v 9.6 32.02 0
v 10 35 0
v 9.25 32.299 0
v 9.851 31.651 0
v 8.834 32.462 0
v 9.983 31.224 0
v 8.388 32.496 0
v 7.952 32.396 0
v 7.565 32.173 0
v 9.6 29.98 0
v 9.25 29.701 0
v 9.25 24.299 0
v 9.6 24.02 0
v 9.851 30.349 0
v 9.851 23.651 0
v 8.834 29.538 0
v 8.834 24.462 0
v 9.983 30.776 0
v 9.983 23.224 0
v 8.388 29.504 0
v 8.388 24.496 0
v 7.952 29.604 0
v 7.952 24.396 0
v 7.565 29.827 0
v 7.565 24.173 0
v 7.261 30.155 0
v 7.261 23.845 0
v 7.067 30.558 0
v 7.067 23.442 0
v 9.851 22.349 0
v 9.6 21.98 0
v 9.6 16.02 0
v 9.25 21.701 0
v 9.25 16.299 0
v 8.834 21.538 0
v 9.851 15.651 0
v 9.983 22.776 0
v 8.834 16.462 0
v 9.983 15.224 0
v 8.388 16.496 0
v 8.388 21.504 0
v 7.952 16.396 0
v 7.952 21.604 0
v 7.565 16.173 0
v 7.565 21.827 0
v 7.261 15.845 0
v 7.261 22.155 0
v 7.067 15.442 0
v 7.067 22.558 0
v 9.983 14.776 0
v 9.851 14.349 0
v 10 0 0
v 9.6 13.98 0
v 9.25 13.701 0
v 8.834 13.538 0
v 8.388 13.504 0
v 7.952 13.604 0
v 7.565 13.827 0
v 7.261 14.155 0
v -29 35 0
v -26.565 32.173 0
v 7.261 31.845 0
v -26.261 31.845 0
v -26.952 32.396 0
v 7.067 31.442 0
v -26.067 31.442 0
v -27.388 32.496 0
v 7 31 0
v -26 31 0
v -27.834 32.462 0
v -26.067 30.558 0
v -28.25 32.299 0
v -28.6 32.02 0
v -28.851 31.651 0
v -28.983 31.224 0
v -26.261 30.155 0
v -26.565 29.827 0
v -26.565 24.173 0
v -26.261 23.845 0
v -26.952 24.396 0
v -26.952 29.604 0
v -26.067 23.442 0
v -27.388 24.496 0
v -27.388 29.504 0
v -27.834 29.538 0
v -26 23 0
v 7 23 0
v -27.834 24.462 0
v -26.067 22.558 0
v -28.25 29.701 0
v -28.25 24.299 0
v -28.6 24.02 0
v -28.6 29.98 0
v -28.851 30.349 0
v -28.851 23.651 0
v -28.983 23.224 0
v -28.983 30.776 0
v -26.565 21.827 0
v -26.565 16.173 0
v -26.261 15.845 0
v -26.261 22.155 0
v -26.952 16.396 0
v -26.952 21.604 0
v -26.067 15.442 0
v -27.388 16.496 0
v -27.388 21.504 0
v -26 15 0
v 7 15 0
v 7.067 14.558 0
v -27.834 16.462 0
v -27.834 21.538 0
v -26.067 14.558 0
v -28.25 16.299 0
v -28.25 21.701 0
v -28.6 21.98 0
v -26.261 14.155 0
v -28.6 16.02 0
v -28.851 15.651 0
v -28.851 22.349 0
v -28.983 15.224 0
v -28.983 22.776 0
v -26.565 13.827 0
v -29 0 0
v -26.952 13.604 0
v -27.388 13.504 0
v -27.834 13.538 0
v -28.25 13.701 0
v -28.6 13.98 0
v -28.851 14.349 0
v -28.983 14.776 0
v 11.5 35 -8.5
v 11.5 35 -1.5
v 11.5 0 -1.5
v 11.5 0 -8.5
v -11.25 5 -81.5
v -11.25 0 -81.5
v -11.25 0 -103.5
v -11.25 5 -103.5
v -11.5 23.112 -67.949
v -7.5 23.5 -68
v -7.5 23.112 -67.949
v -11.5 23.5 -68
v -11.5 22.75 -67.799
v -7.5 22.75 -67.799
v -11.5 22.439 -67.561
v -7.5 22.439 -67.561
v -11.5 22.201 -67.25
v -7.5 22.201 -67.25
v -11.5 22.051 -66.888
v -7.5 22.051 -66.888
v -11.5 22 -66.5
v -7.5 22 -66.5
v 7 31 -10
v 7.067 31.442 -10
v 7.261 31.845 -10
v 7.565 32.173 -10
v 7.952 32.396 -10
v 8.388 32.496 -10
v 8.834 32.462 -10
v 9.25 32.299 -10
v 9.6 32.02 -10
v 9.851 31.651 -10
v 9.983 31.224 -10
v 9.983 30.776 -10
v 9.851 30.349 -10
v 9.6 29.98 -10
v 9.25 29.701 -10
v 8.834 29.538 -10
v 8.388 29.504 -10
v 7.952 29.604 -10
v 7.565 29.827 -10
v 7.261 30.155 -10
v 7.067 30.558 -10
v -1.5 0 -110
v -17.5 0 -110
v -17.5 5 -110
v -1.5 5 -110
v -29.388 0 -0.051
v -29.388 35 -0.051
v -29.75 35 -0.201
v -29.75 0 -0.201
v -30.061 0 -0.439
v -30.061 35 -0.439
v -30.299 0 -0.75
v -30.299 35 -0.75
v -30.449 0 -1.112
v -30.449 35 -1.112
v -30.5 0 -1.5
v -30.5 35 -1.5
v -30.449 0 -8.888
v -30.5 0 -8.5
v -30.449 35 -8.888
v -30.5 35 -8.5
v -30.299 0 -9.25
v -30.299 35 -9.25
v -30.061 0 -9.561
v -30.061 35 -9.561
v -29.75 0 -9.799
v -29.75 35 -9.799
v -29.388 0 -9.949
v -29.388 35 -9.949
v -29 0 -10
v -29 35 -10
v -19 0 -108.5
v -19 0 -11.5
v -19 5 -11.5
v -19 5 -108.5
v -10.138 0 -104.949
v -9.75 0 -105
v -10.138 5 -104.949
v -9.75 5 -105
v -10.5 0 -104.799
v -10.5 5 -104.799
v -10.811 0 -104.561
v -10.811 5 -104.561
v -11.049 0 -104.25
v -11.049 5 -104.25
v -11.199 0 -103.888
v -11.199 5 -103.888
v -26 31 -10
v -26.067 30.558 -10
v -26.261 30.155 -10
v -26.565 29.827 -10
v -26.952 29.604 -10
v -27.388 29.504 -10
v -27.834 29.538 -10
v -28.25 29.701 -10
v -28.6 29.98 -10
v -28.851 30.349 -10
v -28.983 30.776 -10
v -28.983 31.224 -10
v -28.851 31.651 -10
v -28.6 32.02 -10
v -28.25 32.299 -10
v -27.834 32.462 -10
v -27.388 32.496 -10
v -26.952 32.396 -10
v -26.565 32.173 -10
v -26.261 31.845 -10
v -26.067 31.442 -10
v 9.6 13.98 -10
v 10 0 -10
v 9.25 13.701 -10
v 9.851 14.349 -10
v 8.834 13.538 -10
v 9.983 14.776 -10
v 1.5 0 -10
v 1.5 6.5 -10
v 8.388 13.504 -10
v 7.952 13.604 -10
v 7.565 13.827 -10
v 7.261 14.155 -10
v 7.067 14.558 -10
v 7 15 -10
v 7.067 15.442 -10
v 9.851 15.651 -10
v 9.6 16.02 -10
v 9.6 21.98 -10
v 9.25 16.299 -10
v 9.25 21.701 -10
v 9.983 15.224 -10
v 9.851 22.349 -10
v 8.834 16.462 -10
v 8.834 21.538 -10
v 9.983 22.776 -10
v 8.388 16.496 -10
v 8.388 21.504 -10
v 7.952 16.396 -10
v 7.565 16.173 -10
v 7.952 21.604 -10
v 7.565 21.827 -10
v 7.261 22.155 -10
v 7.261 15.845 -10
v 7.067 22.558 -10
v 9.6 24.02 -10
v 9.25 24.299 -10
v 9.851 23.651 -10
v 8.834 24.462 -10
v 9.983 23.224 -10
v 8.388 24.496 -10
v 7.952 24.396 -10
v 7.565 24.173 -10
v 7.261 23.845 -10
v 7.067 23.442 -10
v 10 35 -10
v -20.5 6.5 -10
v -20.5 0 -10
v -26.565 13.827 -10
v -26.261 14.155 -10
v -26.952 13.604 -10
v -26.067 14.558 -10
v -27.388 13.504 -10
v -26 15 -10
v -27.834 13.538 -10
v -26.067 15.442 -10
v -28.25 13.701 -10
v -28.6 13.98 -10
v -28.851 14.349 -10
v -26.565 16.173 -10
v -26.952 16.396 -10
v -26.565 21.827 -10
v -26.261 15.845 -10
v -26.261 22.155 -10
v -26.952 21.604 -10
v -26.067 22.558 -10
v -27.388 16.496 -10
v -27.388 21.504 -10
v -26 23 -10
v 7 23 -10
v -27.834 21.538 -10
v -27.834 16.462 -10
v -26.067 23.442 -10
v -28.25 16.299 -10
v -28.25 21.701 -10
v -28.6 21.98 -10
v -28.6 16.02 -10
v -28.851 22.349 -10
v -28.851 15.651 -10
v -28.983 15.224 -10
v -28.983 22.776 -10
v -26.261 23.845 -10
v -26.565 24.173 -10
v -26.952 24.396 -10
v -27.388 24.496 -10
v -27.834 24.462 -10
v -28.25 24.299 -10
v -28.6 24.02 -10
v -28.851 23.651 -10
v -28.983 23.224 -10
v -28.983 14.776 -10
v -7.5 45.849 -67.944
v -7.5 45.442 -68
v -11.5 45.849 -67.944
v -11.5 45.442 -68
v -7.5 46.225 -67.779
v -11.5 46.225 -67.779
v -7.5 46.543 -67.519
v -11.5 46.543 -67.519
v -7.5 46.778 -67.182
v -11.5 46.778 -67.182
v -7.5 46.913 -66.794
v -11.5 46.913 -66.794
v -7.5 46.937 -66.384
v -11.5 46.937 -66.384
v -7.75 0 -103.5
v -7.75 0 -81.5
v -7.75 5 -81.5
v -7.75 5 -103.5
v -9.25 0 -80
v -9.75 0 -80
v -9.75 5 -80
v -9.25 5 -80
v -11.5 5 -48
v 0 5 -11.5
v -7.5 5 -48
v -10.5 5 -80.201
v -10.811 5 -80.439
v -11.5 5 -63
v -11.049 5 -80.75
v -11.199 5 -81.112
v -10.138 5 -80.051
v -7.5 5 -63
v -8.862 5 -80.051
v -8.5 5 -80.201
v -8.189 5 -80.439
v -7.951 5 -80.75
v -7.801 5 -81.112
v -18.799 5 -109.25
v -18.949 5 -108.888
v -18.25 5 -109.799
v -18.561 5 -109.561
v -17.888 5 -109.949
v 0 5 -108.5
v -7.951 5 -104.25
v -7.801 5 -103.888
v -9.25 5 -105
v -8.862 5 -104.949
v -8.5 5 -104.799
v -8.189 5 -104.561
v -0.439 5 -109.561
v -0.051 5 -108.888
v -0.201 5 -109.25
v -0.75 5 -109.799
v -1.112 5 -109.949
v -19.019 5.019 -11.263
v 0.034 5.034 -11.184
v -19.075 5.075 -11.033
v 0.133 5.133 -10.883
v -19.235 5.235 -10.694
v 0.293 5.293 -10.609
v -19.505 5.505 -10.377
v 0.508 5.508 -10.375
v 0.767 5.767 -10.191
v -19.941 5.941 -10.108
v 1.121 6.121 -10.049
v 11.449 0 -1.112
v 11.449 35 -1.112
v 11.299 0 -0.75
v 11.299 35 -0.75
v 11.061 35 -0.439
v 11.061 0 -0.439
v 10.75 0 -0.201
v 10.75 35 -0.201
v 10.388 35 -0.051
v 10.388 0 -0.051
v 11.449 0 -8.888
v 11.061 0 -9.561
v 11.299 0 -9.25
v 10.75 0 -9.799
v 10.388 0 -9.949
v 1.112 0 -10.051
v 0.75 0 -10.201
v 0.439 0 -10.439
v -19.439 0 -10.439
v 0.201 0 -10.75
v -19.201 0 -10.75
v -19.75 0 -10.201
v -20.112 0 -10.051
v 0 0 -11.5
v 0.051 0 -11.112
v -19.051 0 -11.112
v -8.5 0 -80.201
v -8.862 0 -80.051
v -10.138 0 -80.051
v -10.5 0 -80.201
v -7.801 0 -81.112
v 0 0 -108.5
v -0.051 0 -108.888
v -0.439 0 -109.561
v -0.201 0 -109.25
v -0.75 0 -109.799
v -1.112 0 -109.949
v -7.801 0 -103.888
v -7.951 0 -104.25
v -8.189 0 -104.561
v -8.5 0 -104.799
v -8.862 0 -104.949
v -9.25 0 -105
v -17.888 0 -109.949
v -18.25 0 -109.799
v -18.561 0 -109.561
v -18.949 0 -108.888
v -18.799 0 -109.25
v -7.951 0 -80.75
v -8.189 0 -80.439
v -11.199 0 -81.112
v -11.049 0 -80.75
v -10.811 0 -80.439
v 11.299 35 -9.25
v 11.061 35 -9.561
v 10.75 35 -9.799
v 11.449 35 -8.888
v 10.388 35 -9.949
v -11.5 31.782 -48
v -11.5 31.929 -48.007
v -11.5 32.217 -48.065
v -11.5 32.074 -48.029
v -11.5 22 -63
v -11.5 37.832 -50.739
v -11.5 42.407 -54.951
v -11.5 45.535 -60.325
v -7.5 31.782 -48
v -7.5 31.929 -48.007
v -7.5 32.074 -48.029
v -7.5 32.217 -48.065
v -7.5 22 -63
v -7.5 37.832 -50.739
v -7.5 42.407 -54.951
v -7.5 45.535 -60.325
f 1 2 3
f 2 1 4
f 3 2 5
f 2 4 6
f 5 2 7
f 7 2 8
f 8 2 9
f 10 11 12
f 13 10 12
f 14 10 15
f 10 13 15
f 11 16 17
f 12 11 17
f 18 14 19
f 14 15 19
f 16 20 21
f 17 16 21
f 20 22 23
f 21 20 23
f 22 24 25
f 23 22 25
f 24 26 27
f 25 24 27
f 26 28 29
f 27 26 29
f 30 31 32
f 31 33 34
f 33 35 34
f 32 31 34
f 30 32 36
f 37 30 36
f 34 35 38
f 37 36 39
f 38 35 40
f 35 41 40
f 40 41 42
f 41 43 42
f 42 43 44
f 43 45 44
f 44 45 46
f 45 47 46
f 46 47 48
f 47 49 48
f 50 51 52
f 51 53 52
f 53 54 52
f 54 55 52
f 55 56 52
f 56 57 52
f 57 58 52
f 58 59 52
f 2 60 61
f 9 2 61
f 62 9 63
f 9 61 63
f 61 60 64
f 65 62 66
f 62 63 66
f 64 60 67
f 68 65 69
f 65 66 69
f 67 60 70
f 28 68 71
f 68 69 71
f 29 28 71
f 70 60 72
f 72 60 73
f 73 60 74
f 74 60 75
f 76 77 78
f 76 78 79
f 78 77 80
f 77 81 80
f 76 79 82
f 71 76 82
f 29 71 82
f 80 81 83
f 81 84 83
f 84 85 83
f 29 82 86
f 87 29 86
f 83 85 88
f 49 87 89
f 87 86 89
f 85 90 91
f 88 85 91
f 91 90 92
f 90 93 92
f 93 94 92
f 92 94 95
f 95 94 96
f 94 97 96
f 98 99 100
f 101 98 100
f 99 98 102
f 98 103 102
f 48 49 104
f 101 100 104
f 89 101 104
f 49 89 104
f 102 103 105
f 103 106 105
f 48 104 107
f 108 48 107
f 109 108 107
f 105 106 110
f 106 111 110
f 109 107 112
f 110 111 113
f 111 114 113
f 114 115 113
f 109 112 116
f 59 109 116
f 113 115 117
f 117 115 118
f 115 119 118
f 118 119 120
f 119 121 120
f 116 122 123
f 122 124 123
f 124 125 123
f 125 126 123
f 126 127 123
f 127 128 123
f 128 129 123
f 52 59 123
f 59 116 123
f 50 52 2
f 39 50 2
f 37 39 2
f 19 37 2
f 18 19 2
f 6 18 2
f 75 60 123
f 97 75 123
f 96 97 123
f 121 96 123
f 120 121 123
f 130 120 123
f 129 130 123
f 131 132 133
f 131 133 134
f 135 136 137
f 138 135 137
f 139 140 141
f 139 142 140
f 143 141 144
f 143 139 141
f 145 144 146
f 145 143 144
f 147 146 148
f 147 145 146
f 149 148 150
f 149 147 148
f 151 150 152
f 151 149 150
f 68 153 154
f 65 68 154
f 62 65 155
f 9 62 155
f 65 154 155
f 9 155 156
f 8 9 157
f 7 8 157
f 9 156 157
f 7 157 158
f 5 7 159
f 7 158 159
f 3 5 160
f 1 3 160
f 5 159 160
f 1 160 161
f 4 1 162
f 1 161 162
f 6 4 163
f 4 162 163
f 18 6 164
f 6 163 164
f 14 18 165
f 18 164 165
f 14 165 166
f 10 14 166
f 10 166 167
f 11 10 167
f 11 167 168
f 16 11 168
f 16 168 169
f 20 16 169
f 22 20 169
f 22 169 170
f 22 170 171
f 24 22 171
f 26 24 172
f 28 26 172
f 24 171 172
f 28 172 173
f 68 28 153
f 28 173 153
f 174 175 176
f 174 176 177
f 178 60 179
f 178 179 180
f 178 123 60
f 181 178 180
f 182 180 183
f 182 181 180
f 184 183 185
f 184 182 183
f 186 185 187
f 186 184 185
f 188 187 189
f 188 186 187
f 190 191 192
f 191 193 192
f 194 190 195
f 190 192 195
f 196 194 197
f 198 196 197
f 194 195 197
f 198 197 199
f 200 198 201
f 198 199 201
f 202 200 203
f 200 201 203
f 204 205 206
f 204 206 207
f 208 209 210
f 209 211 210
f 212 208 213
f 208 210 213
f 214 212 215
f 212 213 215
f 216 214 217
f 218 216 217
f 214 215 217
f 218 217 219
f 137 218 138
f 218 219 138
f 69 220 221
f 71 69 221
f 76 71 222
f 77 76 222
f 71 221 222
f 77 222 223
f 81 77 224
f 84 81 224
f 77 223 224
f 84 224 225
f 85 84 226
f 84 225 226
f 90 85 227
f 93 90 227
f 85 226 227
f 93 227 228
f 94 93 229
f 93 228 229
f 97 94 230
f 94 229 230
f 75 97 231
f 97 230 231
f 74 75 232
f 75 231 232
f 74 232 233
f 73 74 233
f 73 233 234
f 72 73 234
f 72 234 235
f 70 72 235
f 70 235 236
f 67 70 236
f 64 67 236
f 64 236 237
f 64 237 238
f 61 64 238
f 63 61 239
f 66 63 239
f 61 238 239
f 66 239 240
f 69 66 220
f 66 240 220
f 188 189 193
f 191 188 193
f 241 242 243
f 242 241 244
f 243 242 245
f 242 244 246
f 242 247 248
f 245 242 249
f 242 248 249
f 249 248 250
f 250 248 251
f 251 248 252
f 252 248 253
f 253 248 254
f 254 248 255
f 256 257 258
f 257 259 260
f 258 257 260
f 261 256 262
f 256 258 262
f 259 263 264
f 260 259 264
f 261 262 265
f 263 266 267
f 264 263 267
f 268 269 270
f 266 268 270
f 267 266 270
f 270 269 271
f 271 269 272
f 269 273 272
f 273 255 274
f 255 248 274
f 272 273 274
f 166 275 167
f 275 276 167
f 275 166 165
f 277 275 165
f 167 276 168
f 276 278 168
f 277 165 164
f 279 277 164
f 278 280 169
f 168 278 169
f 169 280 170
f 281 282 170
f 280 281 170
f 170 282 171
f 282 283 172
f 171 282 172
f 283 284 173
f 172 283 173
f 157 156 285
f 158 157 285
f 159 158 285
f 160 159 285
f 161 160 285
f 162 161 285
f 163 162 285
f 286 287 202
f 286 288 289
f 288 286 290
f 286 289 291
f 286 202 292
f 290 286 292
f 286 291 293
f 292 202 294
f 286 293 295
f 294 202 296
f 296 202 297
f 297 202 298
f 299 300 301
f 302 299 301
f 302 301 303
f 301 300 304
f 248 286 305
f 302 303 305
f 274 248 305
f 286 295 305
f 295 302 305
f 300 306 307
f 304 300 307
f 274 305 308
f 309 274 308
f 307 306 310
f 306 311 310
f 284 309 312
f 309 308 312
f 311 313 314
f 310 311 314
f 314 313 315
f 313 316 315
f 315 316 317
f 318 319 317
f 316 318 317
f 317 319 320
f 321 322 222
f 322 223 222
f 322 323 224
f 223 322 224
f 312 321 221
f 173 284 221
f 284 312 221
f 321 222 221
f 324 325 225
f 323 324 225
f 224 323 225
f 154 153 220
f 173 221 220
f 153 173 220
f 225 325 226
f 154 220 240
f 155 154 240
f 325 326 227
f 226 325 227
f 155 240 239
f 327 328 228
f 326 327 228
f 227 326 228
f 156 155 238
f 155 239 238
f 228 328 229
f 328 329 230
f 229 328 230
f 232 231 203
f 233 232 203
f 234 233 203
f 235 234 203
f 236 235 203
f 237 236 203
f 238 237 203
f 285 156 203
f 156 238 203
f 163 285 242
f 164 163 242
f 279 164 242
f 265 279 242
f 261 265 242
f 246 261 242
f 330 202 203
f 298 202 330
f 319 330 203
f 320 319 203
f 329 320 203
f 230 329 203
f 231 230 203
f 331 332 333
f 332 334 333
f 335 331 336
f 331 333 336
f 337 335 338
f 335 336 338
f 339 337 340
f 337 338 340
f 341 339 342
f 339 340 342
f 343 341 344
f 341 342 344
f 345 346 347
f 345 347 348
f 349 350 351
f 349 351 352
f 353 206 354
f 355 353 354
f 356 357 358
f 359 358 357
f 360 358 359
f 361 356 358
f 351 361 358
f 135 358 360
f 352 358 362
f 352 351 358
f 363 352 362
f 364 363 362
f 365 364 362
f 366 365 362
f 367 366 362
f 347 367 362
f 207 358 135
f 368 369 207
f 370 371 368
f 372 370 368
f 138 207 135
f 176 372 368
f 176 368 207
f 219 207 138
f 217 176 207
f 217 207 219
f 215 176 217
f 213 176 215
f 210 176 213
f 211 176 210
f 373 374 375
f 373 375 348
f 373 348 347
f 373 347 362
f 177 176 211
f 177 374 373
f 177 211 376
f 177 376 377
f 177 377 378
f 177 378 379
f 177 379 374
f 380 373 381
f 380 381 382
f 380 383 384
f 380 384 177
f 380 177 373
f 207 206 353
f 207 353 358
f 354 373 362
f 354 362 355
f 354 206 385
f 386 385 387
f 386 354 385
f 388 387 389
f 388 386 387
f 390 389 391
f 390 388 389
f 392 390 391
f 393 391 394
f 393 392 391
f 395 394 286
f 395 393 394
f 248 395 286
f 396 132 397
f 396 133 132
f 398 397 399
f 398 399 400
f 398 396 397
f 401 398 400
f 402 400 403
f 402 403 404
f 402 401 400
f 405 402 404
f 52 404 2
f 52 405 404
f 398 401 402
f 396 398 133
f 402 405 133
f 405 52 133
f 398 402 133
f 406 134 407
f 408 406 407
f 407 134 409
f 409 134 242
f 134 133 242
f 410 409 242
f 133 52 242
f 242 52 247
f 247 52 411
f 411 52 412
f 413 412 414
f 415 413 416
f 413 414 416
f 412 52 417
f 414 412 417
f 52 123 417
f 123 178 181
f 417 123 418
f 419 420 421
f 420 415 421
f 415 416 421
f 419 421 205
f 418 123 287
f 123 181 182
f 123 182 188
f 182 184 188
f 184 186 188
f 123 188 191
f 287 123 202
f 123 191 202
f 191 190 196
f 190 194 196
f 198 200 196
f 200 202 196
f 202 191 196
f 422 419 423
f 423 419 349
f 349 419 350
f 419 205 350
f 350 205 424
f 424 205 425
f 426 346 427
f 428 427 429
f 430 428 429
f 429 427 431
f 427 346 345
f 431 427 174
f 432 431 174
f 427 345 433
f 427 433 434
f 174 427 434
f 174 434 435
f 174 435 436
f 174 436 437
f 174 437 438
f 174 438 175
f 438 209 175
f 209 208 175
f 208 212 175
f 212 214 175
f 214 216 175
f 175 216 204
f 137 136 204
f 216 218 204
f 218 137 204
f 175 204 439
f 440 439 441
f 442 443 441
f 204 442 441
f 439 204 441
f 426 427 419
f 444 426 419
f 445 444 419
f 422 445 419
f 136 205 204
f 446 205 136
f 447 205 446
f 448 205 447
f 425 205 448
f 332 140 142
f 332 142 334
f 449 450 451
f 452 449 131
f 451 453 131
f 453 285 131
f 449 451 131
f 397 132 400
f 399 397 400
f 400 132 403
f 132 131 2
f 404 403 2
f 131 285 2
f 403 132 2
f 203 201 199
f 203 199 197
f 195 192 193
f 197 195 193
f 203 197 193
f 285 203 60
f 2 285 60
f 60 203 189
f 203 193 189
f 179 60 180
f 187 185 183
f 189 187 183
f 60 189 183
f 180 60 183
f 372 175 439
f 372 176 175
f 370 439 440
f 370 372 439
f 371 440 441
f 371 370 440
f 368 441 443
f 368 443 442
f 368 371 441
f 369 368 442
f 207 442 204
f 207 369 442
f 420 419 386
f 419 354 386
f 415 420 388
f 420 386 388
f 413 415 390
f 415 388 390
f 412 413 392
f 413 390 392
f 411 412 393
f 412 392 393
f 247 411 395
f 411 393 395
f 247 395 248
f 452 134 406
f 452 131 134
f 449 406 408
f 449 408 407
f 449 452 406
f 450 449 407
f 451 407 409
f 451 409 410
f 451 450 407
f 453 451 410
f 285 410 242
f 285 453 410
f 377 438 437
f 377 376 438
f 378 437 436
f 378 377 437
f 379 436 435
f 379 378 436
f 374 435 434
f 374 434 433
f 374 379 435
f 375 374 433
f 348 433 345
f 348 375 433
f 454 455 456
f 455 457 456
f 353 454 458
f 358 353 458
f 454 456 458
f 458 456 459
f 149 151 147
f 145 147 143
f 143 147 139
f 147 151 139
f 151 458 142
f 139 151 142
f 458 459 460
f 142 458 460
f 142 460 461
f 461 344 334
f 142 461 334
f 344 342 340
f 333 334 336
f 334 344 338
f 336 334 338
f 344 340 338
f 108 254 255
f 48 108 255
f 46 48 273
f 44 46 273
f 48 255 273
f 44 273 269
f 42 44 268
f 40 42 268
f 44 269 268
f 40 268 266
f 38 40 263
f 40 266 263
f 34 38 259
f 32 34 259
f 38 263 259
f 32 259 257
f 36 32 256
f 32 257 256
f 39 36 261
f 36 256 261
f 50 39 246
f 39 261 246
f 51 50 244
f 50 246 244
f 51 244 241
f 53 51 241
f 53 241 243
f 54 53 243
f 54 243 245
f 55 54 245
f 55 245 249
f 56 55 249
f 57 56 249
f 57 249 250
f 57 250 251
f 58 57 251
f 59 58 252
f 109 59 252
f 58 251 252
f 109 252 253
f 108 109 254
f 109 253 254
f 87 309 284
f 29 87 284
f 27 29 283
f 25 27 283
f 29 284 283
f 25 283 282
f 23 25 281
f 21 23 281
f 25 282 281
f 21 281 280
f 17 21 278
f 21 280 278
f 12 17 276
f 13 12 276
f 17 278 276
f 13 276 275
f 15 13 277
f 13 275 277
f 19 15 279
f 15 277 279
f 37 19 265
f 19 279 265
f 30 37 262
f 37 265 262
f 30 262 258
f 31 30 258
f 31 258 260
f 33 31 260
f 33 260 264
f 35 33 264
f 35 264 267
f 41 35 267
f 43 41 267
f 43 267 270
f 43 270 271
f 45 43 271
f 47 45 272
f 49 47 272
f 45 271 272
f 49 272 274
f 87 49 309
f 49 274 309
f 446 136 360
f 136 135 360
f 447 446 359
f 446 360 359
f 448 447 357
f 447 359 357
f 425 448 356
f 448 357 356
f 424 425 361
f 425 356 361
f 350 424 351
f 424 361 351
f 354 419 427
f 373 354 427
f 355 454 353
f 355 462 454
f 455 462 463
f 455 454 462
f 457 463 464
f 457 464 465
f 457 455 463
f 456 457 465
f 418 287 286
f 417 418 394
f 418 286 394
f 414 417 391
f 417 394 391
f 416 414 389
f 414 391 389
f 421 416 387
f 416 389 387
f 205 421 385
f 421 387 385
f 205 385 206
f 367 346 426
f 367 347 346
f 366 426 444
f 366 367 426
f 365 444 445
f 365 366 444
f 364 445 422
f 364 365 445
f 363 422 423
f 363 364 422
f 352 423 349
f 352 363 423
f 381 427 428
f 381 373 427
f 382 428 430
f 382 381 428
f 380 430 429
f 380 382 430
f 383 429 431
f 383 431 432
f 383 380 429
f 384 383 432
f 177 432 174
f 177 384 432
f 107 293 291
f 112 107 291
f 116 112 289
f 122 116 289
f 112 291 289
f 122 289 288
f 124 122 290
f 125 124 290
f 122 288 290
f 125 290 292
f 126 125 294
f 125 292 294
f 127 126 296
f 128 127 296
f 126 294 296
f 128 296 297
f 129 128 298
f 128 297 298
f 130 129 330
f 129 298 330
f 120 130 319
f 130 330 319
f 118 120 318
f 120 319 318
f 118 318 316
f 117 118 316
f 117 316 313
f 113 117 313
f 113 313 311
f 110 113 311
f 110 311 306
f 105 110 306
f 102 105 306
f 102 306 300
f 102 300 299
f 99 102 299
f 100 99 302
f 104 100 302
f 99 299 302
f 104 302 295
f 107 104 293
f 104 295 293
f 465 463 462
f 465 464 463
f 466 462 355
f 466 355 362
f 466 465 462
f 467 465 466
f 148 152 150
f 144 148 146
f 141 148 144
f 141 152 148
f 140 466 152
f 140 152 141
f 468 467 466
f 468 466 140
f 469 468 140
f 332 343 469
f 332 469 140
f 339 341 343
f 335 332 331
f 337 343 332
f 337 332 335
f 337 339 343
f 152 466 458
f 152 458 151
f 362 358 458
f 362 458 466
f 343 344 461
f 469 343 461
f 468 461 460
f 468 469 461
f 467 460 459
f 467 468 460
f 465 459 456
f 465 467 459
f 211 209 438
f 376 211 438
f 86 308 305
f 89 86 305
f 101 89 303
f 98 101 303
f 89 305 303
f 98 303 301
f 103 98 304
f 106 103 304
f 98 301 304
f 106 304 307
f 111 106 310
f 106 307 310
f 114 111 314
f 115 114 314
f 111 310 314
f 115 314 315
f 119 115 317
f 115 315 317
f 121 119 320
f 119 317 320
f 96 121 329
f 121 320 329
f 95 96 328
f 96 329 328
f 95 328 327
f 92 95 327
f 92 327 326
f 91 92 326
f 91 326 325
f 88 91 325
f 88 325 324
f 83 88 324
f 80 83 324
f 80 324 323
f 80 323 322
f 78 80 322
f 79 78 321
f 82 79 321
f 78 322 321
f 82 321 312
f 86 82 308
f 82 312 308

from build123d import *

# Parameters (mm, degrees)
SKETCH1_W                = 19
SKETCH1_H                = 110
SKETCH1_W_2              = 3.5
SKETCH1_H_2              = 25
BOSS_EXTRUDE1_DEPTH      = 5
BOSS_EXTRUDE2_DEPTH      = 11.5
BOSS_EXTRUDE2_DEPTH_BACK = 30.5
SKETCH3_R                = 1.5
CUT_EXTRUDE1_DEPTH       = 10
SKETCH4_W                = 4
SKETCH4_H                = 15
BOSS_EXTRUDE3_DEPTH      = 17
BOSS_EXTRUDE4_DEPTH      = 4
FILLET1_R                = 1.5


with BuildPart() as part:
    # Sketch1 → Boss-Extrude1 (new body)
    with BuildSketch(Plane(origin=(0, 0, 0), x_dir=(1, 0, 0), z_dir=(0, 1, 0))):
        with Locations((-9.5, 55)):
            Rectangle(SKETCH1_W, SKETCH1_H)
        with Locations((-9.5, 92.5)):
            Rectangle(SKETCH1_W_2, SKETCH1_H_2, mode=Mode.SUBTRACT)
    extrude(amount=BOSS_EXTRUDE1_DEPTH)

    # Sketch2 → Boss-Extrude2 (add, two sides: drawn at the far end of the back side and taken through both)
    with BuildSketch(Plane(origin=(0, 0, 0), x_dir=(0, 0, -1), z_dir=(1, 0, 0)).offset(-BOSS_EXTRUDE2_DEPTH_BACK)):
        Polygon((10, 15), (10, 35), (0, 35), (0, 15), (0, 5), (0, 0), (10, 0), (10, 5), align=None)
    extrude(amount=BOSS_EXTRUDE2_DEPTH + BOSS_EXTRUDE2_DEPTH_BACK)

    # Sketch3 → Cut-Extrude1 (cut)
    with BuildSketch(Plane(origin=(0, 0, -10), x_dir=(-1, 0, 0), z_dir=(0, 0, -1))):
        with Locations((-8.5, 31)):
            Circle(SKETCH3_R)
        with Locations((-8.5, 23)):
            Circle(SKETCH3_R)
        with Locations((-8.5, 15)):
            Circle(SKETCH3_R)
        with Locations(Location((27.5, 15, 0), (0, 0, 180))):
            Circle(SKETCH3_R)
        with Locations(Location((27.5, 23, 0), (0, 0, 180))):
            Circle(SKETCH3_R)
        with Locations(Location((27.5, 31, 0), (0, 0, 180))):
            Circle(SKETCH3_R)
    extrude(amount=-CUT_EXTRUDE1_DEPTH, mode=Mode.SUBTRACT)

    # Sketch4 → Boss-Extrude3 (add)
    with BuildSketch(Plane(origin=(0, 5, 0), x_dir=(1, 0, 0), z_dir=(0, 1, 0))):
        with Locations((-9.5, 55.5)):
            Rectangle(SKETCH4_W, SKETCH4_H)
    extrude(amount=BOSS_EXTRUDE3_DEPTH)

    # Sketch5 → Boss-Extrude4 (add)
    with BuildSketch(Plane(origin=(-7.5, 0, 0), x_dir=(0, 0, -1), z_dir=(1, 0, 0))):
        with BuildLine():
            Line((63, 22), (68, 22))
            Line((68, 22), (68, 47))
            ThreePointArc((68, 47), (55.5, 42.833333333), (48, 32))
            Line((48, 32), (48, 22))
            Line((48, 22), (63, 22))
        make_face()
    extrude(amount=-BOSS_EXTRUDE4_DEPTH)

    # Fillet1
    fillet1_edges = [part.edges().sort_by_distance(p)[0] for p in [
        (-11.25, 2.5, -105),
        (-11.25, 2.5, -80),
        (-7.75, 2.5, -80),
        (-7.75, 2.5, -105),
        (-19, 2.5, -10),
        (0, 2.5, -10),
        (-30.5, 17.5, -10),
        (-30.5, 17.5, 0),
        (-9.5, 5, -10),
        (11.5, 17.5, 0),
        (11.5, 17.5, -10),
        (-19, 2.5, -110),
        (0, 2.5, -110),
        (-9.5, 32, -48),
        (-9.5, 47, -68),
        (-9.5, 22, -68),
    ]]
    fillet(fillet1_edges, radius=FILLET1_R - 0.0001)  # a hair under: the kernel refuses the full size


solid = part.part
